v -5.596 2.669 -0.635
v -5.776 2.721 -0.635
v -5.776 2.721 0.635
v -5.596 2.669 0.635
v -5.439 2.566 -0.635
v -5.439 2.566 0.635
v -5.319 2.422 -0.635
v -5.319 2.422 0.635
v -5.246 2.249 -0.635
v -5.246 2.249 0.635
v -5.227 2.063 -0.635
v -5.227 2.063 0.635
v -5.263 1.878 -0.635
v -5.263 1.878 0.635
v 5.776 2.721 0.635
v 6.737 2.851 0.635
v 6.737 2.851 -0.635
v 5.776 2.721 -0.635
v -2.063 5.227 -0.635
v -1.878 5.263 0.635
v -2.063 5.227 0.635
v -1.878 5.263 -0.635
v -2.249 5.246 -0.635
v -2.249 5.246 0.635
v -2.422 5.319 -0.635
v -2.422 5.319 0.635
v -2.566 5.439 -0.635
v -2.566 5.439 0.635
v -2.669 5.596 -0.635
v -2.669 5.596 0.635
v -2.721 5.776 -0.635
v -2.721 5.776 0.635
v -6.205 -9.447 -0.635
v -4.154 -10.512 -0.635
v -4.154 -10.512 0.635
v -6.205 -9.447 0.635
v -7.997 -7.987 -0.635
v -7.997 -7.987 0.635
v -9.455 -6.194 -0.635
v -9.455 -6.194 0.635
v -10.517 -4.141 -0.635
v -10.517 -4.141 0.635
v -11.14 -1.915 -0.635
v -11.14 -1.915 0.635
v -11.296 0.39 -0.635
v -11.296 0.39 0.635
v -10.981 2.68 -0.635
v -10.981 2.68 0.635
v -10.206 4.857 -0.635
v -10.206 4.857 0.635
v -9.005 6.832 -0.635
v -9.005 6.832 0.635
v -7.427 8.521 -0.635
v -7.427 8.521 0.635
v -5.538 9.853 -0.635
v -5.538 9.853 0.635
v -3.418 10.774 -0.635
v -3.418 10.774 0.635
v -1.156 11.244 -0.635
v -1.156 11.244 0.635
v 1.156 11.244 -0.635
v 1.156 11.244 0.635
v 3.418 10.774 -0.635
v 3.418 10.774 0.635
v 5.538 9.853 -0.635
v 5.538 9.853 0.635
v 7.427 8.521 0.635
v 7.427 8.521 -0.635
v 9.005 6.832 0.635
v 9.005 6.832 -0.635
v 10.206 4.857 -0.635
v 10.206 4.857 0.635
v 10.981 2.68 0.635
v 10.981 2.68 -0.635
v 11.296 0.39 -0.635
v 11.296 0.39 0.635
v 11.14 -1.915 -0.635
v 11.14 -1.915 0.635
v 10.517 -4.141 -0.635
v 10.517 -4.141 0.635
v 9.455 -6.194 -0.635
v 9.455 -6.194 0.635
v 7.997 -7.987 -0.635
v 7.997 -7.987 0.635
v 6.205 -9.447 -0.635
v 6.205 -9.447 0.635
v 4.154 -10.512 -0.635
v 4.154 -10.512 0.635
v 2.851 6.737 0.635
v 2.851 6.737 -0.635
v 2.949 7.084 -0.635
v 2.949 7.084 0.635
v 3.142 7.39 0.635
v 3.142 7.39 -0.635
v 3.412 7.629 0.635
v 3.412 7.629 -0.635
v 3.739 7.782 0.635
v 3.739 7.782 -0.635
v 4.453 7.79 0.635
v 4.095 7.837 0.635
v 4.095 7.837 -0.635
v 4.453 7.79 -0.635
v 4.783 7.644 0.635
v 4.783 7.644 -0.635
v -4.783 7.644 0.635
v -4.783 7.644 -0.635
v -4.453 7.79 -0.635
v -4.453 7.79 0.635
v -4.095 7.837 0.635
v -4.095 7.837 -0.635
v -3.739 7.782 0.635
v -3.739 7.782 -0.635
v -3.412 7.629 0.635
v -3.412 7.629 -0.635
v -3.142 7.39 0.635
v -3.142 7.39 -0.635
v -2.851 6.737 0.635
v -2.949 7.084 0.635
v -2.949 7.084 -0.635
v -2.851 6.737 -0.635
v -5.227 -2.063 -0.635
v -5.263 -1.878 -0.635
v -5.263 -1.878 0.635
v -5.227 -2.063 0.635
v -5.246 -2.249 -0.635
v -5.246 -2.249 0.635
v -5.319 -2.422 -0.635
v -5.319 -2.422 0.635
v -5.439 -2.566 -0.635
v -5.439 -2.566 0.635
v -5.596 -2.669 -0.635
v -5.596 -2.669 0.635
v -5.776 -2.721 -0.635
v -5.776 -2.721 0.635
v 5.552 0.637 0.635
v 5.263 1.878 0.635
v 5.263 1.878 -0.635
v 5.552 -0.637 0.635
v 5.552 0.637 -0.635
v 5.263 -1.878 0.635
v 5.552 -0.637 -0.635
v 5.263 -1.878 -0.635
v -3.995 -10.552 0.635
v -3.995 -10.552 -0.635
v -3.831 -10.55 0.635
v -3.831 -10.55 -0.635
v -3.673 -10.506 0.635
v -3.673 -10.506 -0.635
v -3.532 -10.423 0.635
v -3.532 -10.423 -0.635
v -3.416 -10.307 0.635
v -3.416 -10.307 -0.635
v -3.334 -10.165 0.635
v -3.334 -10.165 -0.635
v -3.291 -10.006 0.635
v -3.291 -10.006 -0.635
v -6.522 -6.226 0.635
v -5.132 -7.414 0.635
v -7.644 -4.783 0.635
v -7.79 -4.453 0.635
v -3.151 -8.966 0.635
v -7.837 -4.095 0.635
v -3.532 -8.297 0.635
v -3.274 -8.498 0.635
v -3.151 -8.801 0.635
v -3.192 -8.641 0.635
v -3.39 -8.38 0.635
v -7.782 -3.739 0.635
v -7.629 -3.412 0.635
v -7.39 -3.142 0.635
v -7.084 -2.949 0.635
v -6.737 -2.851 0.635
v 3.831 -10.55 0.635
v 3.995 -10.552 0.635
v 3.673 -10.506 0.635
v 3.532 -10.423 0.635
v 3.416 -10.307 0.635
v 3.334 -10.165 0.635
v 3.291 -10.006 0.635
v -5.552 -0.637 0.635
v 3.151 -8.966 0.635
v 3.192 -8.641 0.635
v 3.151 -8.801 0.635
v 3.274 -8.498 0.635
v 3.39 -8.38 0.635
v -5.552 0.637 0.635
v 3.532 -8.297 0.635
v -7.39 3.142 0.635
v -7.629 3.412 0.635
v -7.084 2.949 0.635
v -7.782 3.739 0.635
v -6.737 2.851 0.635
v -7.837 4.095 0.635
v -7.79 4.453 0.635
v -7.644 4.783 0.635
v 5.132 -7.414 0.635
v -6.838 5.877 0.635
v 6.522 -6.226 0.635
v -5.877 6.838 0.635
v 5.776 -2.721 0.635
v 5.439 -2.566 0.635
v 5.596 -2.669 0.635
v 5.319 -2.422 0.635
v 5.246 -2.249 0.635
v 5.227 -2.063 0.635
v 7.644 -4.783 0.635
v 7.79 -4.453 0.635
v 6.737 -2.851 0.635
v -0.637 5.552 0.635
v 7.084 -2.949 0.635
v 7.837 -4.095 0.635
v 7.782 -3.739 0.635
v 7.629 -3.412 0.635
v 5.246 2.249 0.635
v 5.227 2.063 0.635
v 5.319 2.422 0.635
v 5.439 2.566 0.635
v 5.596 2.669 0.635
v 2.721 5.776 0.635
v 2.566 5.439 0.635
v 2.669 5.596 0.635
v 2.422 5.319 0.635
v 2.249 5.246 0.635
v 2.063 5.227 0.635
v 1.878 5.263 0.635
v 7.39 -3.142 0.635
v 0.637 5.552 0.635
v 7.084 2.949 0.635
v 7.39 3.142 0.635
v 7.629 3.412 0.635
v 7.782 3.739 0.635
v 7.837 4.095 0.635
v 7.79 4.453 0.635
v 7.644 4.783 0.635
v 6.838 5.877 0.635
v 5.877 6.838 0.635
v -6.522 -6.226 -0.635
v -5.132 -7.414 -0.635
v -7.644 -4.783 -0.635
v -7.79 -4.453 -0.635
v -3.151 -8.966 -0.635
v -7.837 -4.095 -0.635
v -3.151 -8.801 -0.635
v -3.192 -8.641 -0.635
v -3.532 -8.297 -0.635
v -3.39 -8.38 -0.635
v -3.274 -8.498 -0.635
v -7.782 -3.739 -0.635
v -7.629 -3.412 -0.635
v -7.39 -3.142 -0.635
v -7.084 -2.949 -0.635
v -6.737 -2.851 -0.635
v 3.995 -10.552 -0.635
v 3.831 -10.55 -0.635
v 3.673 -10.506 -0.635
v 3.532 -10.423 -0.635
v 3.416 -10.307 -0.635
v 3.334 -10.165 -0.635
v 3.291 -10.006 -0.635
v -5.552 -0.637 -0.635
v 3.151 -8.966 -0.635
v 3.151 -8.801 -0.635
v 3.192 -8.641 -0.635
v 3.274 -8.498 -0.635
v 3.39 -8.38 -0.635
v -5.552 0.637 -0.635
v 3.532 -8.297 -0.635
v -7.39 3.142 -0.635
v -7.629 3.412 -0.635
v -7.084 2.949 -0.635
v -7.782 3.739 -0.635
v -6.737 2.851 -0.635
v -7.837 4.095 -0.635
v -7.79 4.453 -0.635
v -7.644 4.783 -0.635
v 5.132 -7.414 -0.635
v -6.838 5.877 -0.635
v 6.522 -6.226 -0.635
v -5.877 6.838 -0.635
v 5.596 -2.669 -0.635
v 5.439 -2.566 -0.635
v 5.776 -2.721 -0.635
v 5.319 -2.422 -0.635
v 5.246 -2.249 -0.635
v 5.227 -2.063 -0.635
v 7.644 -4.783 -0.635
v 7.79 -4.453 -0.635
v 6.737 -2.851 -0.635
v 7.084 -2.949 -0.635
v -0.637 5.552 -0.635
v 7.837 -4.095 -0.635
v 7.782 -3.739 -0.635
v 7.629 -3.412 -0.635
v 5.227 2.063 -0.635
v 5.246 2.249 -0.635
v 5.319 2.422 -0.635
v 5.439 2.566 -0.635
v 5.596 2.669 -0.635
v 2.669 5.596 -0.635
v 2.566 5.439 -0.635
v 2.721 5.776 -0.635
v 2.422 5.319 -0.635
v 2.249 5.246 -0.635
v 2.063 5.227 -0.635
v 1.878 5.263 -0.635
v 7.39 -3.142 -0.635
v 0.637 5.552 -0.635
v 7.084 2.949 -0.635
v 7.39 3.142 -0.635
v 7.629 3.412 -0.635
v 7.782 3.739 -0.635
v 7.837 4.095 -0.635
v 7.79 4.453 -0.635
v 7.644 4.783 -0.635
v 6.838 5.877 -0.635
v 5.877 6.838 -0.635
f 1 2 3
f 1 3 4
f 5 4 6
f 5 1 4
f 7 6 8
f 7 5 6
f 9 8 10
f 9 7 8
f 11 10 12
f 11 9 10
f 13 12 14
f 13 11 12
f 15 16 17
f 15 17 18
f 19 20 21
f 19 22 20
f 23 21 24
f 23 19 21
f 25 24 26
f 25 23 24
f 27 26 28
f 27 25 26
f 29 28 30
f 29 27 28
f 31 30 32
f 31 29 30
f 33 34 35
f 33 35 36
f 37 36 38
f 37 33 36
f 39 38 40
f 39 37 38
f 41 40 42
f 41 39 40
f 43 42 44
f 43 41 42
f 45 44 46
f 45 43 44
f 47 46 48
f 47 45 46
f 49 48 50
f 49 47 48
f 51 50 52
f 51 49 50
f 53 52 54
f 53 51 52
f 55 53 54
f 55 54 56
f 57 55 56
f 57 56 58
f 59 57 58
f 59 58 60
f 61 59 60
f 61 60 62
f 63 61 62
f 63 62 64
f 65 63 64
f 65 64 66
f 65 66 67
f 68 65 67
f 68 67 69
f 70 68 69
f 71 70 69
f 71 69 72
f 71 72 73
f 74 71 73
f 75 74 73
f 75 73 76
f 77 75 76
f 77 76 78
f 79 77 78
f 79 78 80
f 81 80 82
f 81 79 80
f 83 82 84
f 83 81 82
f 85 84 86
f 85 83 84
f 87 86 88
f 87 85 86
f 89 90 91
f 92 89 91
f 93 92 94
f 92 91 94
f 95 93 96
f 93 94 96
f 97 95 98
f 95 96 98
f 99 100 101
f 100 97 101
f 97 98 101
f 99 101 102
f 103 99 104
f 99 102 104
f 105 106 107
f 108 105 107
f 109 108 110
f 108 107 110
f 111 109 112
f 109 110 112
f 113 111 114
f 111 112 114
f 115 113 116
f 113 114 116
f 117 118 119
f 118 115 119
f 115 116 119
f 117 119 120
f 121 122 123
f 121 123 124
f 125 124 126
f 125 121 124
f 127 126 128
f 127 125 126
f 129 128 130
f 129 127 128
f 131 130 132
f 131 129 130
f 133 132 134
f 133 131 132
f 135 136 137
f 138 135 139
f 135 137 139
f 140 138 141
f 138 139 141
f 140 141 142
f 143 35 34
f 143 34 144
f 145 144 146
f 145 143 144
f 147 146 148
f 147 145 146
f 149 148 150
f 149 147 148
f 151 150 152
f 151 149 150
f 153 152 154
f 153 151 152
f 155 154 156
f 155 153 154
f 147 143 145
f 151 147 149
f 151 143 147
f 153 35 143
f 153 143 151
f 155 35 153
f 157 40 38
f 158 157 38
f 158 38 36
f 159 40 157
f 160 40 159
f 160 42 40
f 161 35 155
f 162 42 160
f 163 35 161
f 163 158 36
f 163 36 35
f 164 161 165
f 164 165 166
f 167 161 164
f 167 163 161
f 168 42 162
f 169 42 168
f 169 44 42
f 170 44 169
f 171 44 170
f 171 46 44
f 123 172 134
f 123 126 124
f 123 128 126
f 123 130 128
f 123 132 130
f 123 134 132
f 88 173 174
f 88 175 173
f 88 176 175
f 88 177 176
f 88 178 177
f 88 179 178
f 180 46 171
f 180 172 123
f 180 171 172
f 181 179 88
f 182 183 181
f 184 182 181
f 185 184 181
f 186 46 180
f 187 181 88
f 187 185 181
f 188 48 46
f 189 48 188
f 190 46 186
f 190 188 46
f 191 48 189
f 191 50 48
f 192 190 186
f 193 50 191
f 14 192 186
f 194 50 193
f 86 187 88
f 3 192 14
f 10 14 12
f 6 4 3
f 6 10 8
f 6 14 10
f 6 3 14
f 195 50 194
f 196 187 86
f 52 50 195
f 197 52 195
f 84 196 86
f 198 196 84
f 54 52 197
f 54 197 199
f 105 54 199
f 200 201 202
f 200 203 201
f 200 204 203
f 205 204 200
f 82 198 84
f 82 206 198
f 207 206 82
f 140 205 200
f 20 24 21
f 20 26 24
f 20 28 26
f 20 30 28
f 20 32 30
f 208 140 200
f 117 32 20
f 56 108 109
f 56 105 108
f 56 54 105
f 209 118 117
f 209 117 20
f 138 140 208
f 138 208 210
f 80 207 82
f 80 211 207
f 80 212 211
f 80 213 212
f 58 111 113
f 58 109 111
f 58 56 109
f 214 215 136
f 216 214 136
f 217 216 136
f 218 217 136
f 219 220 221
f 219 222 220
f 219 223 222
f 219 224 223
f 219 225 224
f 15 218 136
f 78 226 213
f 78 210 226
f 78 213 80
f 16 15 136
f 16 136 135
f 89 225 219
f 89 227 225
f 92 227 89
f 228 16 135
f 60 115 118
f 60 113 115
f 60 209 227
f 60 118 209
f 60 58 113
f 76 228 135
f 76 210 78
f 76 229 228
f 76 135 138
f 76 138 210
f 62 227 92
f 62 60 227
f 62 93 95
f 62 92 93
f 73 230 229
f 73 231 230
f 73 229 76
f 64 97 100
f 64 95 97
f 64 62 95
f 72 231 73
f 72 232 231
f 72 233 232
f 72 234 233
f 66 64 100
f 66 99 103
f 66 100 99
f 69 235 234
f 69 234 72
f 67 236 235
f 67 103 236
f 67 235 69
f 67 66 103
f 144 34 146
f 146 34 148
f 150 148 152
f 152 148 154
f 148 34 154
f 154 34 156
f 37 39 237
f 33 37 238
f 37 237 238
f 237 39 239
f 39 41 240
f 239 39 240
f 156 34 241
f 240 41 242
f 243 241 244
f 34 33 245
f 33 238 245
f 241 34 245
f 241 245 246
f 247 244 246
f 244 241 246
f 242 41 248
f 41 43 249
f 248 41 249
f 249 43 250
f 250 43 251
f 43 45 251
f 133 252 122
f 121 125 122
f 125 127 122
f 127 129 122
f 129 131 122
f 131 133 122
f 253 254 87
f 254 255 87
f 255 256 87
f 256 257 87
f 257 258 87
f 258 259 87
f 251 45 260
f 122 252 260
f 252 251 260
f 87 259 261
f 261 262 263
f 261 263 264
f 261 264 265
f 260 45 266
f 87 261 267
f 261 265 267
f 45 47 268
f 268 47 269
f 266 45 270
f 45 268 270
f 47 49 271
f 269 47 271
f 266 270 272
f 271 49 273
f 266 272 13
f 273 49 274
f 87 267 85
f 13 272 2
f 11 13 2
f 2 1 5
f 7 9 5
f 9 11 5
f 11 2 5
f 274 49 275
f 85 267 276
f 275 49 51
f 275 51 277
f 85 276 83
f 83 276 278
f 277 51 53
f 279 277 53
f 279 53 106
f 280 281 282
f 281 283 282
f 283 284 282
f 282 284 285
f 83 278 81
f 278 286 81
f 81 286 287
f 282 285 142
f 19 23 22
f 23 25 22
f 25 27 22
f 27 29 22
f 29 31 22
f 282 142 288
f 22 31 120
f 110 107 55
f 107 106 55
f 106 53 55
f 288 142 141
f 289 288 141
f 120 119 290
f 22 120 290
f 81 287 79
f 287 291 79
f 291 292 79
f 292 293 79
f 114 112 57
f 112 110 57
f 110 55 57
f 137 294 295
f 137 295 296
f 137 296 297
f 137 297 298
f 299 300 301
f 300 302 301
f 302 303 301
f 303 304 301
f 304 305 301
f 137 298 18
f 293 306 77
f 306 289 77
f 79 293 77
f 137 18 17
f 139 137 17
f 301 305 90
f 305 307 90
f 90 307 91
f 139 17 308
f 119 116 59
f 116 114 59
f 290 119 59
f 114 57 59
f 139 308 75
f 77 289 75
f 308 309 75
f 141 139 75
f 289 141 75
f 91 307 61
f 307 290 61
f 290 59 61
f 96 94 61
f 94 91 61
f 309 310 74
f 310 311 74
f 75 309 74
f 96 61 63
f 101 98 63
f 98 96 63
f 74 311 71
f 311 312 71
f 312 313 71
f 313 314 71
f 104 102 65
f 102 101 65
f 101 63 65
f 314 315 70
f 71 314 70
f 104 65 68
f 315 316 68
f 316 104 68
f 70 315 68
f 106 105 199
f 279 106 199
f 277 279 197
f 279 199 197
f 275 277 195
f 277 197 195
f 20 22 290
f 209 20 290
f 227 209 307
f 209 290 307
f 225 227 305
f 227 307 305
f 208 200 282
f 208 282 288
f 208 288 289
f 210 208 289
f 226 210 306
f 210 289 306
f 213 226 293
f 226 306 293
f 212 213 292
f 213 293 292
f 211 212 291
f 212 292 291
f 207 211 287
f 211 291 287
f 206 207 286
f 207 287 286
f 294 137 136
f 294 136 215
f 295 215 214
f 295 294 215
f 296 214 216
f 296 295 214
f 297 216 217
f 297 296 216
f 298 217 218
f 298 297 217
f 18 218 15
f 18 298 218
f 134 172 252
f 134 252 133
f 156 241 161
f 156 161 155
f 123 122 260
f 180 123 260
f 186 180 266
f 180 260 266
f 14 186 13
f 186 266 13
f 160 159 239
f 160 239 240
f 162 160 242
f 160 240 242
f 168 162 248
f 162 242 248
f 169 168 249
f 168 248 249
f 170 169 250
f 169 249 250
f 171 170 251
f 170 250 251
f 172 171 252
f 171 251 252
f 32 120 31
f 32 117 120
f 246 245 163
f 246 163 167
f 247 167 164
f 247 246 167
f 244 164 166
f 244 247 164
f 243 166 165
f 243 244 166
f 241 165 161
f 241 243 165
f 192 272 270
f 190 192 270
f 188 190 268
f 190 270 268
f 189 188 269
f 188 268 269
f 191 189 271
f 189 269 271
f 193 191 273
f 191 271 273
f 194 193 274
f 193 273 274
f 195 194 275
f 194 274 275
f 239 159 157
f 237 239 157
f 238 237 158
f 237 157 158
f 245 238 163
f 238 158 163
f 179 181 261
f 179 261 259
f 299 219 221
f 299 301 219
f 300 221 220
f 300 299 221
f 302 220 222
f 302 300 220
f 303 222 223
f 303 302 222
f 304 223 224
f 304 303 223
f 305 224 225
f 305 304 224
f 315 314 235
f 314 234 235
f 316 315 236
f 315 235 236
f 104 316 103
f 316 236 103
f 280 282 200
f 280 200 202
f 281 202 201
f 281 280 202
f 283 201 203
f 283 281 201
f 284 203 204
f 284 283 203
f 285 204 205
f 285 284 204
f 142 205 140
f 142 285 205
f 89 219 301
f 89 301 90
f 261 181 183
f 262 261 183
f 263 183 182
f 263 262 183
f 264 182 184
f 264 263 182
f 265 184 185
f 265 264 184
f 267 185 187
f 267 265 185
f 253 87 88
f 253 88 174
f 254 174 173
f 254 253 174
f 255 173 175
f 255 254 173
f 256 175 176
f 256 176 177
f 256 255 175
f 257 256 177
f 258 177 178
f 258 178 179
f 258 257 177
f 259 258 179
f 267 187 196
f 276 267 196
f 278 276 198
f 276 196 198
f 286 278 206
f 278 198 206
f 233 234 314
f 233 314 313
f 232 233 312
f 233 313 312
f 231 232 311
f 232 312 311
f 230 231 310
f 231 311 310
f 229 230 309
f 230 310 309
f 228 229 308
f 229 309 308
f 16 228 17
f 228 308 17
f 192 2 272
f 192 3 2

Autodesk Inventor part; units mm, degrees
ref_plane "YZ Plane" through (0, 0, 0) normal (1, 0, 0) x (0, 1, 0)
ref_plane "XZ Plane" through (0, 0, 0) normal (0, 1, 0) x (-1, 0, 0)
ref_plane "XY Plane" through (0, 0, 0) normal (0, 0, 1) x (1, 0, 0)
sketch "Sketch1" plane through (0, 0, 0) normal (0, 0, 1) x (1, 0, 0)
  circle A0 centre (0, 0) radius 5.588
  circle A1 centre (0, 0) radius 11.303
  dimension "d0" = 11.176
  dimension "d1" = 22.606
extrude "Extrusion1" add sketch "Sketch1" along normal mid plane 1.27
sketch "Sketch2" plane through (0, 0, 0.635) normal (0, 0, 1) x (1, 0, 0)
  circle A0 centre (0, 0) radius 11.303 projected
  circle A1 centre (0, 0) radius 9.017
  line L0 (0, 0) -> (-7.9924, 7.9924) construction
  line L1 (0, 0) -> (-16.0053, 0) construction
  line L2 (-3.0848, 8.4729) -> (-2.2451, 2.2451)
  line L3 (-2.2451, 2.2451) -> (-8.4729, 3.0848)
  dimension "d4" = 2.286
  dimension "d5" = 45
  dimension "d6" = 3.175
  dimension "d7" = 7.62
extrude "Extrusion2" cut sketch "Sketch2" against normal through all contours L2 L3 A1 picked at (-6.1075, 3.3917)
pattern_circular "Circular Pattern1" count 4 over 360 about axis through (0, 0, -10) along (0, 0, 1) of "Extrusion2"
sketch "Sketch3" plane through (0, 0, 0.635) normal (0, 0, 1) x (1, 0, 0)
  line L0 (2.6087, 4.9417) -> (3.0848, 8.4729) projected
  arc A0 (8.4729, 3.0848) -> (3.0848, 8.4729) centre (0, 0) ccw projected
  line L1 (8.4729, 3.0848) -> (4.9417, 2.6087) projected
  arc A1 (4.9417, -2.6087) -> (4.9417, 2.6087) centre (0, 0) ccw projected
  line L2 (4.9417, -2.6087) -> (8.4729, -3.0848) projected
  arc A2 (3.0848, -8.4729) -> (8.4729, -3.0848) centre (0, 0) ccw projected
  line L3 (3.0848, -8.4729) -> (2.6087, -4.9417) projected
  arc A3 (-2.6087, -4.9417) -> (2.6087, -4.9417) centre (0, 0) ccw projected
  line L4 (-2.6087, -4.9417) -> (-3.0848, -8.4729) projected
  arc A4 (-8.4729, -3.0848) -> (-3.0848, -8.4729) centre (0, 0) ccw projected
  line L5 (-8.4729, -3.0848) -> (-4.9417, -2.6087) projected
  arc A5 (-4.9417, 2.6087) -> (-4.9417, -2.6087) centre (0, 0) ccw projected
  line L6 (-4.9417, 2.6087) -> (-8.4729, 3.0848) projected
  arc A6 (-3.0848, 8.4729) -> (-8.4729, 3.0848) centre (0, 0) ccw projected
  line L7 (-3.0848, 8.4729) -> (-2.6087, 4.9417) projected
  arc A7 (2.6087, 4.9417) -> (-2.6087, 4.9417) centre (0, 0) ccw projected
  circle A8 centre (0, 0) radius 11.303 projected
  line L8 (-3.0848, -8.4729) -> (-3.3959, -10.7808)
  circle A9 centre (0, 0) radius 11.303 projected
  line L9 (3.0848, -8.4729) -> (3.3959, -10.7808)
  line L10 (-2.6087, -4.9417) -> (-3.0848, -8.4729) projected
  line L11 (3.0848, -8.4729) -> (2.6087, -4.9417) projected
extrude "Extrusion3" cut sketch "Sketch3" against normal through all contours L9 A8 L8 L4 A3 L3
fillet "Fillet1" radius 1.27 6 edges at (-8.4729, -3.0848, 0) (8.4729, -3.0848, 0) (8.4729, 3.0848, 0) (3.0848, 8.4729, 0) (-3.0848, 8.4729, 0) (-8.4729, 3.0848, 0)
fillet "Fillet1" radius 0.635 10 edges at (-4.9417, -2.6087, 0) (-4.9417, 2.6087, 0) (-2.6087, 4.9417, 0) (2.6087, 4.9417, 0) (4.9417, 2.6087, 0) (4.9417, -2.6087, 0) (-3.0848, -8.4729, 0) (-3.3959, -10.7808, 0) (3.3959, -10.7808, 0) (3.0848, -8.4729, 0)
properties part number "External Klipring for 500 shaft (am-0206)" material "Steel, Carbon"
